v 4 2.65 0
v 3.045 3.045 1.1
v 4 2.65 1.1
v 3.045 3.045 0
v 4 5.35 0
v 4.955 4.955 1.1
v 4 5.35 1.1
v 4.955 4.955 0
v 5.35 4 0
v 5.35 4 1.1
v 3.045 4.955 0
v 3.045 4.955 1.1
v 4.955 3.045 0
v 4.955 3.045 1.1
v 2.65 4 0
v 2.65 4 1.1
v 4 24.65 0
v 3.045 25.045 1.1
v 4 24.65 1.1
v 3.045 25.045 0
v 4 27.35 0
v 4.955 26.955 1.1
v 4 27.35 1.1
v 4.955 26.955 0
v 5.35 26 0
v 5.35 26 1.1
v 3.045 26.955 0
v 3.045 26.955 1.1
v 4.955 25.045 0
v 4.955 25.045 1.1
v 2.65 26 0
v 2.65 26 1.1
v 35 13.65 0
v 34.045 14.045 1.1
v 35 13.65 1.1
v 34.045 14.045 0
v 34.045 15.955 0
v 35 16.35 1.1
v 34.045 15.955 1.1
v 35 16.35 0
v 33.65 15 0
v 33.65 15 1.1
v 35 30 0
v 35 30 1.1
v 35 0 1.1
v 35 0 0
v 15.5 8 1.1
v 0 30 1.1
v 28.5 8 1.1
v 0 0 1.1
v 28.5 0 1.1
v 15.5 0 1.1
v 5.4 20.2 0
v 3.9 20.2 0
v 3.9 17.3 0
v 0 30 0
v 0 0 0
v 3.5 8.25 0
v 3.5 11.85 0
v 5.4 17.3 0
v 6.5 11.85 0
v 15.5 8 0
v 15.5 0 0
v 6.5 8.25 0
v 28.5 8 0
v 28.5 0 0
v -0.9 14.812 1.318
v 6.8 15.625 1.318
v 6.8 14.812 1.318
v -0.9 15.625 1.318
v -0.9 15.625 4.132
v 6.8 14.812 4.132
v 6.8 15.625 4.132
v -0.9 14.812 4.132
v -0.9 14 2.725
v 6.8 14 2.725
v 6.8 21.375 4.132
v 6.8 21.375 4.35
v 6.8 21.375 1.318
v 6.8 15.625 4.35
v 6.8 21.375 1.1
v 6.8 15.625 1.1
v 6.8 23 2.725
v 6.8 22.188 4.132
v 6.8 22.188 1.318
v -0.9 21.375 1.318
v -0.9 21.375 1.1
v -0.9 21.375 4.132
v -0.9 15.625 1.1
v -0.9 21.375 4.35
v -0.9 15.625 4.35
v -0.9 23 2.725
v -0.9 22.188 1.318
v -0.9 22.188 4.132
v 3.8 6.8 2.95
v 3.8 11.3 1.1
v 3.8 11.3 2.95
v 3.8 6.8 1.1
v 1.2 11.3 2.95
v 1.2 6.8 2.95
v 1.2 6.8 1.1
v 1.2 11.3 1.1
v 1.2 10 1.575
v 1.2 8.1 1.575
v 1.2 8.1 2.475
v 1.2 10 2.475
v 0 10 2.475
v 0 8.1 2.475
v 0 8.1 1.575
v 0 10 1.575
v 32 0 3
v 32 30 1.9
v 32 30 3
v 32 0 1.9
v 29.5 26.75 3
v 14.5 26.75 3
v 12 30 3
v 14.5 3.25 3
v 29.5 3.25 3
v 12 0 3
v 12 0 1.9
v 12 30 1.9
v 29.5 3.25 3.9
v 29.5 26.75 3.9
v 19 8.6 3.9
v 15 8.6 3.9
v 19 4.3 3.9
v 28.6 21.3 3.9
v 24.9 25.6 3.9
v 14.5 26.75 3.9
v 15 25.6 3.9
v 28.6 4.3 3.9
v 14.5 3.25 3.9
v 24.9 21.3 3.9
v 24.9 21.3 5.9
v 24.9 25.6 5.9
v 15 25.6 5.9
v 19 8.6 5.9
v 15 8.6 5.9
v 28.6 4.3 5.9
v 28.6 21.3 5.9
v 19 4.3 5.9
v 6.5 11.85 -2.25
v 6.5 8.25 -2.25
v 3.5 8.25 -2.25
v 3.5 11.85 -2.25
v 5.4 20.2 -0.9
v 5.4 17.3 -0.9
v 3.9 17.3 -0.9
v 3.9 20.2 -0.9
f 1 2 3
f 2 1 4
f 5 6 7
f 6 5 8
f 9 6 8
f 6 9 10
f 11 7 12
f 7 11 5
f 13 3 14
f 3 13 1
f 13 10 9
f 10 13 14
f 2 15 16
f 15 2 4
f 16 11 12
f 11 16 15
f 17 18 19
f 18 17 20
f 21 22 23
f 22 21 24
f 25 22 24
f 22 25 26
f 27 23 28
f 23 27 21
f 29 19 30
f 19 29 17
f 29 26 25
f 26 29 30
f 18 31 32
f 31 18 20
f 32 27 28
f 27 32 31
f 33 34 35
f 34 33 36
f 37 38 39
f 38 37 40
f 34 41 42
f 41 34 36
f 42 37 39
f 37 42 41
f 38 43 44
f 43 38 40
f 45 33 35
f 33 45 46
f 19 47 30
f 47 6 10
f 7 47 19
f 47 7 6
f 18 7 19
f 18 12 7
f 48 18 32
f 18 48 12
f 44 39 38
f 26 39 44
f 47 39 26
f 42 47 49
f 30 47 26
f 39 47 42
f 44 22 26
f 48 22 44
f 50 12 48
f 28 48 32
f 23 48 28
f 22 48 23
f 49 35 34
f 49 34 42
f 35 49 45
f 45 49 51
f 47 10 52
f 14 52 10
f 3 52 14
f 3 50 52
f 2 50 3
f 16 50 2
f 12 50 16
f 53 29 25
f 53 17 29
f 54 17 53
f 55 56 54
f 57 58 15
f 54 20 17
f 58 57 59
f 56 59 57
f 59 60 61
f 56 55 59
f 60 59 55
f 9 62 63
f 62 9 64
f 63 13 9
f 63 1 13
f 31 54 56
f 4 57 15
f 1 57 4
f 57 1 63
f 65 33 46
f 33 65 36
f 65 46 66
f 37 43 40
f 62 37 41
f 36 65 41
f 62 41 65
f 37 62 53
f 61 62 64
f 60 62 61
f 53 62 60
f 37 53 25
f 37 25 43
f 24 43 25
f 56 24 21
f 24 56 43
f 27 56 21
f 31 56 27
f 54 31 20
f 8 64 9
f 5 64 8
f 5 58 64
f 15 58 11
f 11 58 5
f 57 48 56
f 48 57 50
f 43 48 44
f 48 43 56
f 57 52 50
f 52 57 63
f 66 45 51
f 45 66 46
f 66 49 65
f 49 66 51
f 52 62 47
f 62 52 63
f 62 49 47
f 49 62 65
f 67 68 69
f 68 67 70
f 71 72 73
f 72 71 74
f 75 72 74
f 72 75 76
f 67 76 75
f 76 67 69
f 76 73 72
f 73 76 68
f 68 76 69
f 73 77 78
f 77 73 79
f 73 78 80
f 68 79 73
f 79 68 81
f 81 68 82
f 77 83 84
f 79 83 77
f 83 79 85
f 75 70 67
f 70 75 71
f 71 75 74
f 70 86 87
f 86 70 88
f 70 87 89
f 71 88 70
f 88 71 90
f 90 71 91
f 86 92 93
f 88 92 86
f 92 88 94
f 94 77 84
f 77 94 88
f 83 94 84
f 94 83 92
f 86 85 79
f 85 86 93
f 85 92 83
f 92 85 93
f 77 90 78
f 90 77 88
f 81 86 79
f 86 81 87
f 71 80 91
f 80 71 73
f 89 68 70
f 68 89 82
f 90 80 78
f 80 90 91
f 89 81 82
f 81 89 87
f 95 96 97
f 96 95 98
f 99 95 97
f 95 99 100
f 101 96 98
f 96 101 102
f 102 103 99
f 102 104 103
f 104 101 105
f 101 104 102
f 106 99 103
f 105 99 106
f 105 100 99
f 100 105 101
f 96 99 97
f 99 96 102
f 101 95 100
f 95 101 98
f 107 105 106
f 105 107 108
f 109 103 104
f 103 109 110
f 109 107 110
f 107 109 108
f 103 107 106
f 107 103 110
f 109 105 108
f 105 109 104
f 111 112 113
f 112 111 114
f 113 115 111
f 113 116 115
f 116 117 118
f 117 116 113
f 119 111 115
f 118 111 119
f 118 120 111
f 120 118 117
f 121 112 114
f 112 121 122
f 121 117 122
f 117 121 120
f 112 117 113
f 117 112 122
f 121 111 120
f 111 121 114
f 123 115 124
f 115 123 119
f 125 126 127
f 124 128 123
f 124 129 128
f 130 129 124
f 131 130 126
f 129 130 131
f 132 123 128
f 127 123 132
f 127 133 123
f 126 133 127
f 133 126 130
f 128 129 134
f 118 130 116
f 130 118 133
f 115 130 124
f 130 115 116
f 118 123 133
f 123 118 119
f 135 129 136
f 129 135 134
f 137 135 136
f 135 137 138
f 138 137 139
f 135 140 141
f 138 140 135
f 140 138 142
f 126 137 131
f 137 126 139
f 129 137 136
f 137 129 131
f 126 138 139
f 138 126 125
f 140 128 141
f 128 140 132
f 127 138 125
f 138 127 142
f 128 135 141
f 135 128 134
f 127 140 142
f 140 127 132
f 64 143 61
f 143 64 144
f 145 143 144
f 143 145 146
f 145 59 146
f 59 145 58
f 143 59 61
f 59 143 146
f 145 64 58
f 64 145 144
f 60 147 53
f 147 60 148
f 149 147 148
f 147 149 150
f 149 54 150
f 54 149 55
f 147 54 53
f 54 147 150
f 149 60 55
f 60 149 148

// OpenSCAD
module rak19003_mounting_holes(diameter=2.70, h=5, includePartial=true) {
	positions = [
		[4.00, 4.00],
		[4.00, 26.00],
		/* [35.00, 15.00], */
	];
	for (position = positions) {
		translate(position) {
			cylinder(d=diameter, h=h);
		}
	}
	if (includePartial) {
		translate([35, 15]) {
			cylinder(d=diameter, h=h);
		}
	}
}

module rak19003_board() {
	thickness = 1.1;
	e = 0.1;
	difference() {
		color("#555555")
			cube([35, 30, thickness]); // TODO: verify board thickness
		
		translate([15.5, 0-e, -1*e])
		cube([28.5-15.5, 8+e, thickness+(2*e)]);
		translate([0,0,-0.1]) rak19003_mounting_holes($fn=8);
	}


	translate([-0.9, 14, thickness]) usb_c_port();
	translate([0, 6.8, thickness]) reset_button();
	// TODO: LEDs
	
	// various large components
	color("#CC9900")
		translate([3.5, 8.25, -2.25])
		cube([3, 3.6, 2.25]);
	color("#333333")
		translate([3.9, 17.3, -0.9])
		cube([1.5, 2.9, 0.9]);
		
	translate([12, 0, thickness + 0.8]) rak_core_board();
}

module rak_core_board() {
	color("#555555")
		cube([20, 30, 1.1]);
	color("#119933")
	translate([2.5, (30-23.5)/2, 1.1])
		cube([15, 23.5, 0.9]);
	color("#CCCCCC")
	translate([3, 8.6, 2])
		cube([9.9, 17, 2]);
	color("#CCCCCC")
	translate([7, 4.3, 2])
		cube([9.6, 17, 2]);
}

module usb_c_port() {
	color("#CCCCCC")
		usb_c();
		/* cube([7.7, 9.0, 3.25]); */
}

module usb_c(width=9, h=3.25, depth=7.7) {
	thickness=h;
	r=thickness/2;
	rotate([90, 0, 90]) {
		translate([r, r, 0])
			cylinder(r=r, h=depth);
		translate([width-r, r, 0])
		cylinder(r=r, h=depth);
		translate([r, 0, 0])
			cube([width-thickness, thickness, depth]);
	}
}



module reset_button() {
	majThickness = 1.85;
	btnThickness = 0.9;
	majWidth = 4.5;
	btnWidth = 1.9;
	btnProud = 1.2;
	color("#FFEEEE") // cream color in hex
		translate([btnProud, 0, 0])
		cube([2.6, majWidth, majThickness]);
	color("#777777")
		translate([0, (majWidth - btnWidth)/2, (majThickness - btnThickness)/2])
		cube([btnProud, btnWidth, btnThickness]);
}

module rak19003_model() {
	rak19003_board();

}

rak19003_model();
